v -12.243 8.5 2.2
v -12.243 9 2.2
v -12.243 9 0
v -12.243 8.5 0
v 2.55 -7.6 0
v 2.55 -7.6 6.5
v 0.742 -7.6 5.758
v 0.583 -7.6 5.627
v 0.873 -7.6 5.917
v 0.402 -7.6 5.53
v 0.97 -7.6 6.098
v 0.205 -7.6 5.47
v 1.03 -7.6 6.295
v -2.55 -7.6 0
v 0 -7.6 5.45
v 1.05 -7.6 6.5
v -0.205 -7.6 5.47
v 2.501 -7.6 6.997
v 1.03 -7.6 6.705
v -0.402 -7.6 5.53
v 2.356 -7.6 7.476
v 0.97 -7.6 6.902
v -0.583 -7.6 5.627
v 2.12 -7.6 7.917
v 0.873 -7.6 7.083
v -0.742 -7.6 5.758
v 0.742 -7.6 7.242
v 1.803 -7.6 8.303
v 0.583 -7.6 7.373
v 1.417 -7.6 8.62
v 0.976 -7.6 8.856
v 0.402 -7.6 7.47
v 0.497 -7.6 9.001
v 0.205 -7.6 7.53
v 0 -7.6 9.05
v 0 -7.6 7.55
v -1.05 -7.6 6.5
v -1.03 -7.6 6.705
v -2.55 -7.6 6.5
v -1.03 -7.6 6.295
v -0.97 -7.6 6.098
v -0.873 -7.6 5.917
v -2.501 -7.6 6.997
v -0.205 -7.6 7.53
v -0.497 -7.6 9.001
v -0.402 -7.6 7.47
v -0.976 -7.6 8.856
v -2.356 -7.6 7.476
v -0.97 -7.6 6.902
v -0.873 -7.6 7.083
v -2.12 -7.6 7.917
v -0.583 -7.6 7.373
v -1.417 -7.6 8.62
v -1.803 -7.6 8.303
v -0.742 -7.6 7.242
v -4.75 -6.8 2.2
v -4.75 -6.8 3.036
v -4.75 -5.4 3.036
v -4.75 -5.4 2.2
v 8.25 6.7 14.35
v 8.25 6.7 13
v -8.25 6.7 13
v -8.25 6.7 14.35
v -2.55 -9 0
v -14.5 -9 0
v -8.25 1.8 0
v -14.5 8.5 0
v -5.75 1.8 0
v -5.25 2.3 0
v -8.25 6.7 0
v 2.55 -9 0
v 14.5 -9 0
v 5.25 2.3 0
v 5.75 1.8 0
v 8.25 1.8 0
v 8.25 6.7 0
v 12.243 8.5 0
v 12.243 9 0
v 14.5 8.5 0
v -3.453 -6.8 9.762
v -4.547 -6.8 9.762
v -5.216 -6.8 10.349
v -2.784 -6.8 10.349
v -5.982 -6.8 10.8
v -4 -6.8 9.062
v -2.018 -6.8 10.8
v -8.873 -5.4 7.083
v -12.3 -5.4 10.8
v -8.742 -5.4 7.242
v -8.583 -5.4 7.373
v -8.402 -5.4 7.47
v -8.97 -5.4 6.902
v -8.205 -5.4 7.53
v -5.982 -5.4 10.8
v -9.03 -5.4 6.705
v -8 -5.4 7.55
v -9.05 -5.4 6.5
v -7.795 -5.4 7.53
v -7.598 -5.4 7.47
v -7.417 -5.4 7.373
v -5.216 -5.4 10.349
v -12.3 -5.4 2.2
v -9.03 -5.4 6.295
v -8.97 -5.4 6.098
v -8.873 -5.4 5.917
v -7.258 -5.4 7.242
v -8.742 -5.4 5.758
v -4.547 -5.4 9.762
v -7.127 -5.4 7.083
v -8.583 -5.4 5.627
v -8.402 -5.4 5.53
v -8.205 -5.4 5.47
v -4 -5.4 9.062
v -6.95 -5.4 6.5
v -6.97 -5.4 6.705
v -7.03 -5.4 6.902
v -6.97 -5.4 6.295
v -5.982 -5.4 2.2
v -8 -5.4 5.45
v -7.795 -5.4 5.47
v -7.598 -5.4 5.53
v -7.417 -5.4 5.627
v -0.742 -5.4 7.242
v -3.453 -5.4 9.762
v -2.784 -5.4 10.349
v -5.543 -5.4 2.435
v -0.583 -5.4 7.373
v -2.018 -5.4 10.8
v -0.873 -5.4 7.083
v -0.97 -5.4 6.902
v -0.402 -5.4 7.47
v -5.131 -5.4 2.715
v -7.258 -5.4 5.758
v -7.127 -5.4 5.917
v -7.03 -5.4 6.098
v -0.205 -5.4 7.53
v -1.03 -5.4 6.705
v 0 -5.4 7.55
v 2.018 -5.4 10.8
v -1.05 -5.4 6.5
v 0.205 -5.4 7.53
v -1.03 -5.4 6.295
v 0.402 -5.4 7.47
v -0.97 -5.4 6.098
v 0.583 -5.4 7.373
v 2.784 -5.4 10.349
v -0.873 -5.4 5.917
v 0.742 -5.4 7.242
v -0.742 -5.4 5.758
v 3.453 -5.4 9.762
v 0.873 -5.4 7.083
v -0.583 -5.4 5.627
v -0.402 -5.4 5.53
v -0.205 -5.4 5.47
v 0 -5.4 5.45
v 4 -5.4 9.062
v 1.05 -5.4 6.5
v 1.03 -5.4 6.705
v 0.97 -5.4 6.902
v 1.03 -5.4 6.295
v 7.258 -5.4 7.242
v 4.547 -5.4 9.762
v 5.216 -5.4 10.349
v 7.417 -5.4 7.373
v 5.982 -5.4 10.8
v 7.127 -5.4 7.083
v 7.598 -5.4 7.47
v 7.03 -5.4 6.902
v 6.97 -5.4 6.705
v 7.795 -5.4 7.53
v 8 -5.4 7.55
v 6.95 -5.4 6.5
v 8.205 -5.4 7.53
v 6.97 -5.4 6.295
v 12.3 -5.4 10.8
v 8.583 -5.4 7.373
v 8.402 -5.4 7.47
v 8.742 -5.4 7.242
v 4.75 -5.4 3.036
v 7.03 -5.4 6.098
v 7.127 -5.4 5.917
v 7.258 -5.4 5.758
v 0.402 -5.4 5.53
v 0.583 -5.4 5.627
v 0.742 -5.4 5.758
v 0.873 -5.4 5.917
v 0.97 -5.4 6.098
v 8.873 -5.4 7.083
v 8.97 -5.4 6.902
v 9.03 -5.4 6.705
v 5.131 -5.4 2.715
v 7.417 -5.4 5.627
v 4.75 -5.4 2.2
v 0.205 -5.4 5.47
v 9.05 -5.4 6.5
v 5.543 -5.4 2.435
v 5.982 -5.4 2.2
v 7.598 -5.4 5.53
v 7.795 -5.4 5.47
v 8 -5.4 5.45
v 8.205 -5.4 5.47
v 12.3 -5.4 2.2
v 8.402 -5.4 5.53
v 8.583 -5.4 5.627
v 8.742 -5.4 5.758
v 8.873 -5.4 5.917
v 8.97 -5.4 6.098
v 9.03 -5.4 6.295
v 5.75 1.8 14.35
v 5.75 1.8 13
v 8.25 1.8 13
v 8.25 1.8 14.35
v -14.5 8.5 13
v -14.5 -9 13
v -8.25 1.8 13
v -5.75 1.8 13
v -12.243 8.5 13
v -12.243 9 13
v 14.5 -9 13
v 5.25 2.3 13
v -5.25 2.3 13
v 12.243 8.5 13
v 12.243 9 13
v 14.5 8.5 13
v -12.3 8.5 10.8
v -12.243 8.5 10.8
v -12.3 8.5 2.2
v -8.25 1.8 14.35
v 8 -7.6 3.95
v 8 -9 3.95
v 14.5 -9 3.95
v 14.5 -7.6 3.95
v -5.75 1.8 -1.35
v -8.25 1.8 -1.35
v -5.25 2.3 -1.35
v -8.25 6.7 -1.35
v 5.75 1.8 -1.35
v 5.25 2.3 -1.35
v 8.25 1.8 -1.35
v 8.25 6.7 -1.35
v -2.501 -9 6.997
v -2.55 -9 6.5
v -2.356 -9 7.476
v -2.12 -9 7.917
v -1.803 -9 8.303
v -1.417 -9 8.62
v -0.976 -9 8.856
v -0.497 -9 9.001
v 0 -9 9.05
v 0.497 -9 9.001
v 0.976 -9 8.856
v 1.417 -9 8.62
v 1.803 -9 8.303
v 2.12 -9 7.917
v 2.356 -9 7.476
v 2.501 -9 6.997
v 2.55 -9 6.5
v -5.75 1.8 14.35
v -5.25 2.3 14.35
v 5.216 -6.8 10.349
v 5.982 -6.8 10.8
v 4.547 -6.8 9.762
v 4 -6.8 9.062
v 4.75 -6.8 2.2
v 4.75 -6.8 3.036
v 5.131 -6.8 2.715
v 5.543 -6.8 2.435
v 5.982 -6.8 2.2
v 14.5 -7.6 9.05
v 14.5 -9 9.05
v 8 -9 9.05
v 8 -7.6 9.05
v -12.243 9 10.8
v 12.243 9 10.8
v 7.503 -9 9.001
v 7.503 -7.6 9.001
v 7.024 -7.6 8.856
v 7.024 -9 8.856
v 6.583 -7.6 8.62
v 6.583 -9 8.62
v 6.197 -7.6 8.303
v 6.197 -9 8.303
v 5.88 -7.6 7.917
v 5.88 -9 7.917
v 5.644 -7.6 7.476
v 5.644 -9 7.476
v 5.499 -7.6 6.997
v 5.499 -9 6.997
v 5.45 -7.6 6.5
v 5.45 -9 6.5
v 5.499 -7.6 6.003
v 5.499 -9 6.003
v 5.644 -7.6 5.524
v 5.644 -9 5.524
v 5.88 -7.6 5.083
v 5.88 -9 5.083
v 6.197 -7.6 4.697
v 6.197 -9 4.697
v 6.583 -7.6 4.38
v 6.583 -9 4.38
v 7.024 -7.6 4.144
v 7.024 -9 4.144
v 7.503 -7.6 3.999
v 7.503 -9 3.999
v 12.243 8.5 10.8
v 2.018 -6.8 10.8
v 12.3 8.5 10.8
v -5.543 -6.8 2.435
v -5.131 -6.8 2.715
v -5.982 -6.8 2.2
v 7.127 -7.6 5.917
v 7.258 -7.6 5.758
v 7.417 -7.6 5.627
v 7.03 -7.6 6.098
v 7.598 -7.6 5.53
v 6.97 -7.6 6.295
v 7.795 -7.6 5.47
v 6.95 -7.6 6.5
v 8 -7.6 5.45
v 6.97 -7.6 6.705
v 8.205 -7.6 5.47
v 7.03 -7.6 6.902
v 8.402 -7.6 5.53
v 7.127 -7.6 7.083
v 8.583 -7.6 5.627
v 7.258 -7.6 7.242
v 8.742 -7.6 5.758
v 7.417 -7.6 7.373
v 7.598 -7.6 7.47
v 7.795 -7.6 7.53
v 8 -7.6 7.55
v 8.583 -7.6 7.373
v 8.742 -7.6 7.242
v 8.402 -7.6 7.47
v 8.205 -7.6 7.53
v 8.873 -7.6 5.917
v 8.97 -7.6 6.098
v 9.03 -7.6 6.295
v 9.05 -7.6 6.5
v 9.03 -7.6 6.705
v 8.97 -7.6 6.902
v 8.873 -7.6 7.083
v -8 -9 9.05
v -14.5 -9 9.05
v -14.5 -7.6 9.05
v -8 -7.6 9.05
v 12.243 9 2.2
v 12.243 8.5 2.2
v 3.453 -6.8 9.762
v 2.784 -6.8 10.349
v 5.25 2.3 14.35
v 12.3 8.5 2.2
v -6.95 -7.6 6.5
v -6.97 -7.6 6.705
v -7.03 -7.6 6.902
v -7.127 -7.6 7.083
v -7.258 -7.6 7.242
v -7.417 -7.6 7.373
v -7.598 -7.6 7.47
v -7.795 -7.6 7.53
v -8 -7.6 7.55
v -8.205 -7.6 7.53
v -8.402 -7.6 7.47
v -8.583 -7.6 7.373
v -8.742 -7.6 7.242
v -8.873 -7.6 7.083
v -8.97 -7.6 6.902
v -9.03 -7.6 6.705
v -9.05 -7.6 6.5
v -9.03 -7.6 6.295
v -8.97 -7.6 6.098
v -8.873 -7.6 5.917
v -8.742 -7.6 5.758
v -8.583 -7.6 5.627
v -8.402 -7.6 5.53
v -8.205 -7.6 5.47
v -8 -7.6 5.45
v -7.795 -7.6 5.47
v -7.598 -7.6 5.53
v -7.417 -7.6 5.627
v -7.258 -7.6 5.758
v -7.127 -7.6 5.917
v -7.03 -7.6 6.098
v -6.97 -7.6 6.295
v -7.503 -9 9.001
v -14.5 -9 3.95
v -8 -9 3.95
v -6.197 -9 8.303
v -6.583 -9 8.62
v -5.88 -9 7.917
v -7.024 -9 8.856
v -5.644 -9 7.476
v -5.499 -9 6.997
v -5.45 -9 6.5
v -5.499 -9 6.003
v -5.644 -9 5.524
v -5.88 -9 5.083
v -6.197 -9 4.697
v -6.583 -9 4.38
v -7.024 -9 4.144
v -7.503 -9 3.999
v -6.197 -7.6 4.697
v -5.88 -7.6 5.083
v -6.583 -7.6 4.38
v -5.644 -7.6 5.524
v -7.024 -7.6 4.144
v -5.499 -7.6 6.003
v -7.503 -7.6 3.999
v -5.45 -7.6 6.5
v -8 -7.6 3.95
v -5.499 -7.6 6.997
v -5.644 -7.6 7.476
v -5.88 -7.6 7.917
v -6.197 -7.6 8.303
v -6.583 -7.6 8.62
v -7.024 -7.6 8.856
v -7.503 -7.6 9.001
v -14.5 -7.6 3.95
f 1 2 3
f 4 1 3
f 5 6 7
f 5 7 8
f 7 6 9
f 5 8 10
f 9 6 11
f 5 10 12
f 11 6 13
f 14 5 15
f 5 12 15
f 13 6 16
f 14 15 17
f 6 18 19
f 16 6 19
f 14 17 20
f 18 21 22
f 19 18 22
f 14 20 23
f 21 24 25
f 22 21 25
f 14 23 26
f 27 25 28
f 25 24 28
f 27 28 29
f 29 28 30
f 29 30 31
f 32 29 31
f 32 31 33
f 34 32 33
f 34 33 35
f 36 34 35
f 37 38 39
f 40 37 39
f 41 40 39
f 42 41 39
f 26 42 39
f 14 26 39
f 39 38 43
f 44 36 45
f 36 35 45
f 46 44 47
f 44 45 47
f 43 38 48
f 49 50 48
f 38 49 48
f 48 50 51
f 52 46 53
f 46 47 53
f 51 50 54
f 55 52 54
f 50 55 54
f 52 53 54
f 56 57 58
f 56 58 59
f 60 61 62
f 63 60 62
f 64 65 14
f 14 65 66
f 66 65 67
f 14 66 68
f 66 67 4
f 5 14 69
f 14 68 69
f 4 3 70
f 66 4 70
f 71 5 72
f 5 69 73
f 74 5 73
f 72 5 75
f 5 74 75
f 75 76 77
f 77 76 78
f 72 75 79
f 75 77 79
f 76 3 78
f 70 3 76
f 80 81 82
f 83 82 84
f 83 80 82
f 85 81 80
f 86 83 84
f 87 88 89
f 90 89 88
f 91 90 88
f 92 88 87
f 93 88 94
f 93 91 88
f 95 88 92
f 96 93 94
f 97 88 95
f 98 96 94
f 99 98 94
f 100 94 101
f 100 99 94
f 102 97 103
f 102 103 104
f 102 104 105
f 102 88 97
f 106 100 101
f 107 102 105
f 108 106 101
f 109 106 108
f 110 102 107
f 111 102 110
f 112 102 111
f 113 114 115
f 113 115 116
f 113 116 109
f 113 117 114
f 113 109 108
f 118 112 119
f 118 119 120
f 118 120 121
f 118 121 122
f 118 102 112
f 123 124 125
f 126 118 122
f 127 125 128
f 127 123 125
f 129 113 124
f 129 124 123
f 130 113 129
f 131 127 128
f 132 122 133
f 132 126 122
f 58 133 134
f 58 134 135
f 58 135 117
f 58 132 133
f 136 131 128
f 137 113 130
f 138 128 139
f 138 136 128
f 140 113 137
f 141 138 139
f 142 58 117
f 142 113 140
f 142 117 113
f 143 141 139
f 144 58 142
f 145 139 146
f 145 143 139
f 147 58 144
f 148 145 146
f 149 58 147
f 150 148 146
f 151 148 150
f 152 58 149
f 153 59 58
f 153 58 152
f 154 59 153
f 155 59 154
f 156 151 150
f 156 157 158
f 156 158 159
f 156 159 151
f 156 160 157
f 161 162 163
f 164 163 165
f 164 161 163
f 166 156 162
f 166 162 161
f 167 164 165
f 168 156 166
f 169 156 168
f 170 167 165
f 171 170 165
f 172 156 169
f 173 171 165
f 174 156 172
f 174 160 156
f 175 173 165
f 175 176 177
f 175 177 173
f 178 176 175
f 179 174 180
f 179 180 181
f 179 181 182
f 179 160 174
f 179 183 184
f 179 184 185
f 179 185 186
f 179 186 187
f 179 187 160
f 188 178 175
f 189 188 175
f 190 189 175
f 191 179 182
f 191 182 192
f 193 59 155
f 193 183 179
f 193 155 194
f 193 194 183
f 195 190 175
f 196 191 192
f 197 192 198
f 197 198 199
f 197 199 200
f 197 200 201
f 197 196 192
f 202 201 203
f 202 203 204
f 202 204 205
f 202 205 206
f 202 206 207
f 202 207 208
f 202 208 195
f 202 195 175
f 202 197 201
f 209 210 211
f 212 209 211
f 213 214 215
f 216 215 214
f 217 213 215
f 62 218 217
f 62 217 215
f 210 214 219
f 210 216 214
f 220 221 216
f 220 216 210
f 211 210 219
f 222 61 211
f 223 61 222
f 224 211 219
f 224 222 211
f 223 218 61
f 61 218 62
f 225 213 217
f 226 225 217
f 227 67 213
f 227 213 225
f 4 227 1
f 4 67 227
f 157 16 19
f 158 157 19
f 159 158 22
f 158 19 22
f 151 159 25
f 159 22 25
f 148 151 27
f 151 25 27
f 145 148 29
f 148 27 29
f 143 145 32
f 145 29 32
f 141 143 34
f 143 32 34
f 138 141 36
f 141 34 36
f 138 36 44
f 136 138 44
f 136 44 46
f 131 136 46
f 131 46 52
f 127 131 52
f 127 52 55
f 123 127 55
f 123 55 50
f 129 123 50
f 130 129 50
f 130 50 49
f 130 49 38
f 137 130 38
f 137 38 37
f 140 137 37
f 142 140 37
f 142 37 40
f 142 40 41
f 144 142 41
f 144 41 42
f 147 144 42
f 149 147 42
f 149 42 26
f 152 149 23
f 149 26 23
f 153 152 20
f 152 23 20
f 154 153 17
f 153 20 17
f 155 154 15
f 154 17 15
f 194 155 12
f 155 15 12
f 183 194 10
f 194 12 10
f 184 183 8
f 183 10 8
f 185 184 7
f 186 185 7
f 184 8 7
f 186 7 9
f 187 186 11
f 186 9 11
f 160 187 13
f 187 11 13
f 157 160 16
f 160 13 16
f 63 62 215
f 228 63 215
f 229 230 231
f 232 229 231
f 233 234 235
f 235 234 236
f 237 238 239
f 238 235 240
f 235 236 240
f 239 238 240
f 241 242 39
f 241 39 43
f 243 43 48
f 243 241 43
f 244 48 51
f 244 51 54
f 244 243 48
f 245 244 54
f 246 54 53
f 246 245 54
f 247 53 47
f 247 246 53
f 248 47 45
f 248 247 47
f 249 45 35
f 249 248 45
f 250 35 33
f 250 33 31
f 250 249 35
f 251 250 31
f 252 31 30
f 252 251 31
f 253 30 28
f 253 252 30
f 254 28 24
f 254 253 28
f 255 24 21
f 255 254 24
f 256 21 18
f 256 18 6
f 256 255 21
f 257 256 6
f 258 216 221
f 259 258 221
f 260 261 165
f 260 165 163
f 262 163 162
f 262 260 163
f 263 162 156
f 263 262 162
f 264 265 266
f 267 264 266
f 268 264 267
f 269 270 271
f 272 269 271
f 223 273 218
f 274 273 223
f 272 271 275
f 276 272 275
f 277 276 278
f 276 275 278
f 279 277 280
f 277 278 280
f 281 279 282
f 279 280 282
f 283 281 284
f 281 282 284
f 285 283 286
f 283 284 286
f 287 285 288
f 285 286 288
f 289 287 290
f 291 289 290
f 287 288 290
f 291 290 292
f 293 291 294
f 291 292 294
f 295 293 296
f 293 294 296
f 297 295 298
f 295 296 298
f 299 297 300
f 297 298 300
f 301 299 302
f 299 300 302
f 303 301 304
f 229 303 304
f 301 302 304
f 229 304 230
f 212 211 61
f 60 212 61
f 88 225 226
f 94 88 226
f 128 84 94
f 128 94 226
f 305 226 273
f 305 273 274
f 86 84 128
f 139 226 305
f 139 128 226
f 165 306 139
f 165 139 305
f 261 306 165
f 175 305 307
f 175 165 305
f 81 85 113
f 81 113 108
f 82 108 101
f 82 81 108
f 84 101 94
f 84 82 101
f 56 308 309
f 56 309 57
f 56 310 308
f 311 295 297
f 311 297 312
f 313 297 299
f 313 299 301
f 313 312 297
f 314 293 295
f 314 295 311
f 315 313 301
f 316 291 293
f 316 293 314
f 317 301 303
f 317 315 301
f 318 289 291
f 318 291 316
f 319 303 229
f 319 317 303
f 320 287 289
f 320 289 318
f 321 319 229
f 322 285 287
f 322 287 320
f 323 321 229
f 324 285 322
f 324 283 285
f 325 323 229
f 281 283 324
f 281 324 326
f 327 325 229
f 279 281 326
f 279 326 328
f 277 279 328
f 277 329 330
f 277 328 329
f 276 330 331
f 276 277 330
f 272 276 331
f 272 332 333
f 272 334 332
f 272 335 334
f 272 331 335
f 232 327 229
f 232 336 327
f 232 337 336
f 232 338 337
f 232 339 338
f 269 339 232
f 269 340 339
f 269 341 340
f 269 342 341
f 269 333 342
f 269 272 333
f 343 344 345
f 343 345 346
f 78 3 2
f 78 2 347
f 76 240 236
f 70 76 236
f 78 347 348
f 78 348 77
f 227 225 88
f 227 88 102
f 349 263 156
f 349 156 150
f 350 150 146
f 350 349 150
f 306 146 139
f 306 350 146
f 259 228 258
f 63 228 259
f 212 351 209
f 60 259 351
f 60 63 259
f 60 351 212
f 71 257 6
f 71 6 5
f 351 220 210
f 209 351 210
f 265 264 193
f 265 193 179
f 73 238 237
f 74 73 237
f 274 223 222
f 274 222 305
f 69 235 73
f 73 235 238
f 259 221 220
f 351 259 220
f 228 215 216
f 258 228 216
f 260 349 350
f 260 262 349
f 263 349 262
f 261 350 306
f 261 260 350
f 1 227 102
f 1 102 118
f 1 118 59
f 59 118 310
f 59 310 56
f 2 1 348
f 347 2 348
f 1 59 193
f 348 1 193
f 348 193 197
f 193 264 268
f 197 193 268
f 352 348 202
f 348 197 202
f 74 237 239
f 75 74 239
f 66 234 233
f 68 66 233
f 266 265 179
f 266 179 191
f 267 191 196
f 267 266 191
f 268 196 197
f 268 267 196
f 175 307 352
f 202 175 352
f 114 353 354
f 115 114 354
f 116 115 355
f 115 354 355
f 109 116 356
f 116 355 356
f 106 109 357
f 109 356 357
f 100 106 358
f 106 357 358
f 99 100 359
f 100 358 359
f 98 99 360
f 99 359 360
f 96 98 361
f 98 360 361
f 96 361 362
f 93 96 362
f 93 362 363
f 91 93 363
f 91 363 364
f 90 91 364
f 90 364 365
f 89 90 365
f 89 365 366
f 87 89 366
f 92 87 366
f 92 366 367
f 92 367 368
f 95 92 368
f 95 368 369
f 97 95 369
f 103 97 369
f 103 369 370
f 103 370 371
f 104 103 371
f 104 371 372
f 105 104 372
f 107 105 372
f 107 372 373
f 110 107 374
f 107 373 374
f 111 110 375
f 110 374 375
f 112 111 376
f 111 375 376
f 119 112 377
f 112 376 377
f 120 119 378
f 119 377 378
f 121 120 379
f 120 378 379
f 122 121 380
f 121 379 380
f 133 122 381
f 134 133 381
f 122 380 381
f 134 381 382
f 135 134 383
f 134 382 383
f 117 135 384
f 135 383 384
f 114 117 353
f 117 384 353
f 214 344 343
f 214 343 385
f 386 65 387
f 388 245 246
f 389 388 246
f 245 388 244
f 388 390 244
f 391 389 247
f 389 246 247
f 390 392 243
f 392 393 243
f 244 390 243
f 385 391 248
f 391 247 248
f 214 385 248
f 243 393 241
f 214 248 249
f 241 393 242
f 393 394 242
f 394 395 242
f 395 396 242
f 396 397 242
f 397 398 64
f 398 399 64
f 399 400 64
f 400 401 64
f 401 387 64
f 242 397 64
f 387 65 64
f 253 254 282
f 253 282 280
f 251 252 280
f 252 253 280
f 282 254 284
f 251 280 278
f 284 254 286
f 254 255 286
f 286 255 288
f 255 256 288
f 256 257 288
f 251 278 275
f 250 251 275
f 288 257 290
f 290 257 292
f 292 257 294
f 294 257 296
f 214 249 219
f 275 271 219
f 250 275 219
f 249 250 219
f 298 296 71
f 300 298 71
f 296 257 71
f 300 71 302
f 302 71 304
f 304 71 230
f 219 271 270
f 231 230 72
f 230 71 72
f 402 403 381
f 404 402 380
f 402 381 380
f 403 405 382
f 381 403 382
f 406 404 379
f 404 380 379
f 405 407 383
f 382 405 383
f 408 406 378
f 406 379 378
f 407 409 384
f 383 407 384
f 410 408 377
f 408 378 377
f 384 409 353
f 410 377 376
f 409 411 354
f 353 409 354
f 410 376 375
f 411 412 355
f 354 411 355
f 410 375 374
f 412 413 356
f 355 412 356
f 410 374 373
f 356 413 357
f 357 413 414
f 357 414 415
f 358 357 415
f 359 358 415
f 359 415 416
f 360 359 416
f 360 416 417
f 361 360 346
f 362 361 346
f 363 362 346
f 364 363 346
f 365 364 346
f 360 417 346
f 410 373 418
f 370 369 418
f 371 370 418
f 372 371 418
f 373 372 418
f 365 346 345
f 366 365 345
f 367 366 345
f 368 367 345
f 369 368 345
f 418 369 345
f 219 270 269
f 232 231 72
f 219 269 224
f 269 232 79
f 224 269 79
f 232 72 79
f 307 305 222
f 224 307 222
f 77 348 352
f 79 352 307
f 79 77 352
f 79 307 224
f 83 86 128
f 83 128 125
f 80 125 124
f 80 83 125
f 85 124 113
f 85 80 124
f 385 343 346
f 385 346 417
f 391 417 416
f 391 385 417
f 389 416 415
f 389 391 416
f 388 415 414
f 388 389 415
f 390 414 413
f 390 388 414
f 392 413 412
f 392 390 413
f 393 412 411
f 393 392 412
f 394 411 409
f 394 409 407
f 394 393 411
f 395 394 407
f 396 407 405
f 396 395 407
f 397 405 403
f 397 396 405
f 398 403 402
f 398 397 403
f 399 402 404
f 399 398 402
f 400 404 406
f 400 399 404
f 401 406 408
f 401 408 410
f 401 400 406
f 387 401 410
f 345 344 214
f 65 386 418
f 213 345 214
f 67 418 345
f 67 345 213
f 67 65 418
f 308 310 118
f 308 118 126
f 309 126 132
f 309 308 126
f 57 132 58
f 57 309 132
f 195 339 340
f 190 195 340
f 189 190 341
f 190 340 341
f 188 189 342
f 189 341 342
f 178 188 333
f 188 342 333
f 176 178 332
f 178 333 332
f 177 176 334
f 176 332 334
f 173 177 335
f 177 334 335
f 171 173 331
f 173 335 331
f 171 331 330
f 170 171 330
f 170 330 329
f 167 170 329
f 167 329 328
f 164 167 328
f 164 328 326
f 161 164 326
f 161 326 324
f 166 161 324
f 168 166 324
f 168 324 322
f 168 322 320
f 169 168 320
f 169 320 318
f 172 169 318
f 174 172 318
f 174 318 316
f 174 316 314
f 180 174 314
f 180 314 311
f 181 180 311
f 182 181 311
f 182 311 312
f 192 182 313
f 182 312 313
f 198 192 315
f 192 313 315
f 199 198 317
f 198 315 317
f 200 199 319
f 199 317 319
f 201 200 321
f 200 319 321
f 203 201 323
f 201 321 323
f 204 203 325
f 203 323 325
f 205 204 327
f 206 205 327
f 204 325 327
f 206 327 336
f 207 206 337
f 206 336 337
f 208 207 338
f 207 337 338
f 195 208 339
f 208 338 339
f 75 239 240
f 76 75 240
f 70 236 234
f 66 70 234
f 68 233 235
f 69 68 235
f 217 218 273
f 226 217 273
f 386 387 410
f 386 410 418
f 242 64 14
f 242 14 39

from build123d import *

# Parameters (mm, degrees)
SKETCH1_W                = 29
SKETCH1_H                = 18
BOSS_EXTRUDE1_DEPTH      = 13
BOSS_EXTRUDE2_DEPTH      = 1.35
BOSS_EXTRUDE2_DEPTH_BACK = 14.35
CUT_EXTRUDE1_DEPTH       = 1.4
SHELL1_START             = -5.4
SHELL1_OUTLINE_W         = 24.6
SHELL1_OUTLINE_H         = 8.6
SHELL1_DEPTH             = 14.4
SHELL1_START_2           = -6.8
SHELL1_2_DEPTH           = 1.4
SKETCH4_R                = 1.05
CUT_EXTRUDE2_DEPTH       = 27.300807972
SKETCH5_W                = 2.257483773
SKETCH5_H                = 13
CUT_EXTRUDE3_DEPTH       = 0.5


# Read off the part's stored shape, not the designer's step: Shell1
with BuildPart() as part:
    # Sketch1 → Boss-Extrude1 (new body)
    with BuildSketch(Plane.XY):
        Rectangle(SKETCH1_W, SKETCH1_H)
    extrude(amount=BOSS_EXTRUDE1_DEPTH)

    # Sketch2 → Boss-Extrude2 (add, two sides: drawn at the far end of the back side and taken through both)
    with BuildSketch(Plane.XY.offset(13).offset(-BOSS_EXTRUDE2_DEPTH_BACK)):
        Polygon((-5.75, 1.8), (-5.25, 2.3), (5.25, 2.3), (5.75, 1.8), (8.25, 1.8), (8.25, 6.7), (-8.25, 6.7), (-8.25, 1.8), align=None)
    extrude(amount=BOSS_EXTRUDE2_DEPTH + BOSS_EXTRUDE2_DEPTH_BACK)

    # Sketch3 → Cut-Extrude1 (cut)
    with BuildSketch(Plane.XZ.offset(9)):
        with BuildLine():
            Line((-2.55, -6.5), (-2.55, 6.5))
            ThreePointArc((-2.55, 6.5), (0, 9.05), (2.55, 6.5))
            Line((2.55, 6.5), (2.55, -6.5))
            ThreePointArc((2.55, -6.5), (0, -9.05), (-2.55, -6.5))
        make_face()
        with BuildLine():
            Line((-21, 9.05), (-8, 9.05))
            ThreePointArc((-8, 9.05), (-5.45, 6.5), (-8, 3.95))
            Line((-8, 3.95), (-21, 3.95))
            ThreePointArc((-21, 3.95), (-23.55, 6.5), (-21, 9.05))
        make_face()
        with BuildLine():
            Line((21, 9.05), (8, 9.05))
            ThreePointArc((8, 9.05), (5.45, 6.5), (8, 3.95))
            Line((8, 3.95), (21, 3.95))
            ThreePointArc((21, 3.95), (23.55, 6.5), (21, 9.05))
        make_face()
    extrude(amount=-CUT_EXTRUDE1_DEPTH, mode=Mode.SUBTRACT)

    # Shell1 outline → Shell1 (cut)
    with BuildSketch(Plane(origin=(0, 0, 0), x_dir=(1, 0, 0), z_dir=(0, 1, 0)).offset(SHELL1_START)):
        with Locations((0, -6.5)):
            Rectangle(SHELL1_OUTLINE_W, SHELL1_OUTLINE_H)
    extrude(amount=SHELL1_DEPTH, mode=Mode.SUBTRACT)

    # Shell1 2 outline → Shell1 2 (cut)
    with BuildSketch(Plane(origin=(0, 0, 0), x_dir=(1, 0, 0), z_dir=(0, 1, 0)).offset(SHELL1_START_2)):
        with BuildLine():
            Line((2.018043607, -10.8), (5.981956393, -10.8))
            ThreePointArc((5.981956393, -10.8), (4.867971715, -10.071120108), (4, -9.061737691))
            ThreePointArc((4, -9.061737691), (3.132028285, -10.071120108), (2.018043607, -10.8))
        make_face()
        with BuildLine():
            ThreePointArc((4.75, -3.035898385), (5.333025611, -2.569383304), (5.981956393, -2.2))
            Line((5.981956393, -2.2), (4.75, -2.2))
            Line((4.75, -2.2), (4.75, -3.035898385))
        make_face()
        with BuildLine():
            Line((-5.981956393, -10.8), (-2.018043607, -10.8))
            ThreePointArc((-2.018043607, -10.8), (-3.132028285, -10.071120108), (-4, -9.061737691))
            ThreePointArc((-4, -9.061737691), (-4.867971715, -10.071120108), (-5.981956393, -10.8))
        make_face()
        with BuildLine():
            Line((-4.75, -3.035898385), (-4.75, -2.2))
            Line((-4.75, -2.2), (-5.981956393, -2.2))
            ThreePointArc((-5.981956393, -2.2), (-5.333025611, -2.569383304), (-4.75, -3.035898385))
        make_face()
    extrude(amount=SHELL1_2_DEPTH, mode=Mode.SUBTRACT)

    # Sketch4 → Cut-Extrude2 (cut, through all)
    with BuildSketch(Plane.XZ.offset(7.6)):
        with Locations((0, 6.5)):
            Circle(SKETCH4_R)
        with Locations((-8, 6.5)):
            Circle(SKETCH4_R)
        with Locations((8, 6.5)):
            Circle(SKETCH4_R)
    extrude(amount=-CUT_EXTRUDE2_DEPTH, mode=Mode.SUBTRACT)

    # Sketch5 → Cut-Extrude3 (cut)
    with BuildSketch(Plane(origin=(0, 9, 0), x_dir=(1, 0, 0), z_dir=(0, 1, 0))):
        with Locations((-13.371258114, -6.5)):
            Rectangle(SKETCH5_W, SKETCH5_H)
        with Locations((13.371258114, -6.5)):
            Rectangle(SKETCH5_W, SKETCH5_H)
    extrude(amount=-CUT_EXTRUDE3_DEPTH, mode=Mode.SUBTRACT)


solid = part.part
